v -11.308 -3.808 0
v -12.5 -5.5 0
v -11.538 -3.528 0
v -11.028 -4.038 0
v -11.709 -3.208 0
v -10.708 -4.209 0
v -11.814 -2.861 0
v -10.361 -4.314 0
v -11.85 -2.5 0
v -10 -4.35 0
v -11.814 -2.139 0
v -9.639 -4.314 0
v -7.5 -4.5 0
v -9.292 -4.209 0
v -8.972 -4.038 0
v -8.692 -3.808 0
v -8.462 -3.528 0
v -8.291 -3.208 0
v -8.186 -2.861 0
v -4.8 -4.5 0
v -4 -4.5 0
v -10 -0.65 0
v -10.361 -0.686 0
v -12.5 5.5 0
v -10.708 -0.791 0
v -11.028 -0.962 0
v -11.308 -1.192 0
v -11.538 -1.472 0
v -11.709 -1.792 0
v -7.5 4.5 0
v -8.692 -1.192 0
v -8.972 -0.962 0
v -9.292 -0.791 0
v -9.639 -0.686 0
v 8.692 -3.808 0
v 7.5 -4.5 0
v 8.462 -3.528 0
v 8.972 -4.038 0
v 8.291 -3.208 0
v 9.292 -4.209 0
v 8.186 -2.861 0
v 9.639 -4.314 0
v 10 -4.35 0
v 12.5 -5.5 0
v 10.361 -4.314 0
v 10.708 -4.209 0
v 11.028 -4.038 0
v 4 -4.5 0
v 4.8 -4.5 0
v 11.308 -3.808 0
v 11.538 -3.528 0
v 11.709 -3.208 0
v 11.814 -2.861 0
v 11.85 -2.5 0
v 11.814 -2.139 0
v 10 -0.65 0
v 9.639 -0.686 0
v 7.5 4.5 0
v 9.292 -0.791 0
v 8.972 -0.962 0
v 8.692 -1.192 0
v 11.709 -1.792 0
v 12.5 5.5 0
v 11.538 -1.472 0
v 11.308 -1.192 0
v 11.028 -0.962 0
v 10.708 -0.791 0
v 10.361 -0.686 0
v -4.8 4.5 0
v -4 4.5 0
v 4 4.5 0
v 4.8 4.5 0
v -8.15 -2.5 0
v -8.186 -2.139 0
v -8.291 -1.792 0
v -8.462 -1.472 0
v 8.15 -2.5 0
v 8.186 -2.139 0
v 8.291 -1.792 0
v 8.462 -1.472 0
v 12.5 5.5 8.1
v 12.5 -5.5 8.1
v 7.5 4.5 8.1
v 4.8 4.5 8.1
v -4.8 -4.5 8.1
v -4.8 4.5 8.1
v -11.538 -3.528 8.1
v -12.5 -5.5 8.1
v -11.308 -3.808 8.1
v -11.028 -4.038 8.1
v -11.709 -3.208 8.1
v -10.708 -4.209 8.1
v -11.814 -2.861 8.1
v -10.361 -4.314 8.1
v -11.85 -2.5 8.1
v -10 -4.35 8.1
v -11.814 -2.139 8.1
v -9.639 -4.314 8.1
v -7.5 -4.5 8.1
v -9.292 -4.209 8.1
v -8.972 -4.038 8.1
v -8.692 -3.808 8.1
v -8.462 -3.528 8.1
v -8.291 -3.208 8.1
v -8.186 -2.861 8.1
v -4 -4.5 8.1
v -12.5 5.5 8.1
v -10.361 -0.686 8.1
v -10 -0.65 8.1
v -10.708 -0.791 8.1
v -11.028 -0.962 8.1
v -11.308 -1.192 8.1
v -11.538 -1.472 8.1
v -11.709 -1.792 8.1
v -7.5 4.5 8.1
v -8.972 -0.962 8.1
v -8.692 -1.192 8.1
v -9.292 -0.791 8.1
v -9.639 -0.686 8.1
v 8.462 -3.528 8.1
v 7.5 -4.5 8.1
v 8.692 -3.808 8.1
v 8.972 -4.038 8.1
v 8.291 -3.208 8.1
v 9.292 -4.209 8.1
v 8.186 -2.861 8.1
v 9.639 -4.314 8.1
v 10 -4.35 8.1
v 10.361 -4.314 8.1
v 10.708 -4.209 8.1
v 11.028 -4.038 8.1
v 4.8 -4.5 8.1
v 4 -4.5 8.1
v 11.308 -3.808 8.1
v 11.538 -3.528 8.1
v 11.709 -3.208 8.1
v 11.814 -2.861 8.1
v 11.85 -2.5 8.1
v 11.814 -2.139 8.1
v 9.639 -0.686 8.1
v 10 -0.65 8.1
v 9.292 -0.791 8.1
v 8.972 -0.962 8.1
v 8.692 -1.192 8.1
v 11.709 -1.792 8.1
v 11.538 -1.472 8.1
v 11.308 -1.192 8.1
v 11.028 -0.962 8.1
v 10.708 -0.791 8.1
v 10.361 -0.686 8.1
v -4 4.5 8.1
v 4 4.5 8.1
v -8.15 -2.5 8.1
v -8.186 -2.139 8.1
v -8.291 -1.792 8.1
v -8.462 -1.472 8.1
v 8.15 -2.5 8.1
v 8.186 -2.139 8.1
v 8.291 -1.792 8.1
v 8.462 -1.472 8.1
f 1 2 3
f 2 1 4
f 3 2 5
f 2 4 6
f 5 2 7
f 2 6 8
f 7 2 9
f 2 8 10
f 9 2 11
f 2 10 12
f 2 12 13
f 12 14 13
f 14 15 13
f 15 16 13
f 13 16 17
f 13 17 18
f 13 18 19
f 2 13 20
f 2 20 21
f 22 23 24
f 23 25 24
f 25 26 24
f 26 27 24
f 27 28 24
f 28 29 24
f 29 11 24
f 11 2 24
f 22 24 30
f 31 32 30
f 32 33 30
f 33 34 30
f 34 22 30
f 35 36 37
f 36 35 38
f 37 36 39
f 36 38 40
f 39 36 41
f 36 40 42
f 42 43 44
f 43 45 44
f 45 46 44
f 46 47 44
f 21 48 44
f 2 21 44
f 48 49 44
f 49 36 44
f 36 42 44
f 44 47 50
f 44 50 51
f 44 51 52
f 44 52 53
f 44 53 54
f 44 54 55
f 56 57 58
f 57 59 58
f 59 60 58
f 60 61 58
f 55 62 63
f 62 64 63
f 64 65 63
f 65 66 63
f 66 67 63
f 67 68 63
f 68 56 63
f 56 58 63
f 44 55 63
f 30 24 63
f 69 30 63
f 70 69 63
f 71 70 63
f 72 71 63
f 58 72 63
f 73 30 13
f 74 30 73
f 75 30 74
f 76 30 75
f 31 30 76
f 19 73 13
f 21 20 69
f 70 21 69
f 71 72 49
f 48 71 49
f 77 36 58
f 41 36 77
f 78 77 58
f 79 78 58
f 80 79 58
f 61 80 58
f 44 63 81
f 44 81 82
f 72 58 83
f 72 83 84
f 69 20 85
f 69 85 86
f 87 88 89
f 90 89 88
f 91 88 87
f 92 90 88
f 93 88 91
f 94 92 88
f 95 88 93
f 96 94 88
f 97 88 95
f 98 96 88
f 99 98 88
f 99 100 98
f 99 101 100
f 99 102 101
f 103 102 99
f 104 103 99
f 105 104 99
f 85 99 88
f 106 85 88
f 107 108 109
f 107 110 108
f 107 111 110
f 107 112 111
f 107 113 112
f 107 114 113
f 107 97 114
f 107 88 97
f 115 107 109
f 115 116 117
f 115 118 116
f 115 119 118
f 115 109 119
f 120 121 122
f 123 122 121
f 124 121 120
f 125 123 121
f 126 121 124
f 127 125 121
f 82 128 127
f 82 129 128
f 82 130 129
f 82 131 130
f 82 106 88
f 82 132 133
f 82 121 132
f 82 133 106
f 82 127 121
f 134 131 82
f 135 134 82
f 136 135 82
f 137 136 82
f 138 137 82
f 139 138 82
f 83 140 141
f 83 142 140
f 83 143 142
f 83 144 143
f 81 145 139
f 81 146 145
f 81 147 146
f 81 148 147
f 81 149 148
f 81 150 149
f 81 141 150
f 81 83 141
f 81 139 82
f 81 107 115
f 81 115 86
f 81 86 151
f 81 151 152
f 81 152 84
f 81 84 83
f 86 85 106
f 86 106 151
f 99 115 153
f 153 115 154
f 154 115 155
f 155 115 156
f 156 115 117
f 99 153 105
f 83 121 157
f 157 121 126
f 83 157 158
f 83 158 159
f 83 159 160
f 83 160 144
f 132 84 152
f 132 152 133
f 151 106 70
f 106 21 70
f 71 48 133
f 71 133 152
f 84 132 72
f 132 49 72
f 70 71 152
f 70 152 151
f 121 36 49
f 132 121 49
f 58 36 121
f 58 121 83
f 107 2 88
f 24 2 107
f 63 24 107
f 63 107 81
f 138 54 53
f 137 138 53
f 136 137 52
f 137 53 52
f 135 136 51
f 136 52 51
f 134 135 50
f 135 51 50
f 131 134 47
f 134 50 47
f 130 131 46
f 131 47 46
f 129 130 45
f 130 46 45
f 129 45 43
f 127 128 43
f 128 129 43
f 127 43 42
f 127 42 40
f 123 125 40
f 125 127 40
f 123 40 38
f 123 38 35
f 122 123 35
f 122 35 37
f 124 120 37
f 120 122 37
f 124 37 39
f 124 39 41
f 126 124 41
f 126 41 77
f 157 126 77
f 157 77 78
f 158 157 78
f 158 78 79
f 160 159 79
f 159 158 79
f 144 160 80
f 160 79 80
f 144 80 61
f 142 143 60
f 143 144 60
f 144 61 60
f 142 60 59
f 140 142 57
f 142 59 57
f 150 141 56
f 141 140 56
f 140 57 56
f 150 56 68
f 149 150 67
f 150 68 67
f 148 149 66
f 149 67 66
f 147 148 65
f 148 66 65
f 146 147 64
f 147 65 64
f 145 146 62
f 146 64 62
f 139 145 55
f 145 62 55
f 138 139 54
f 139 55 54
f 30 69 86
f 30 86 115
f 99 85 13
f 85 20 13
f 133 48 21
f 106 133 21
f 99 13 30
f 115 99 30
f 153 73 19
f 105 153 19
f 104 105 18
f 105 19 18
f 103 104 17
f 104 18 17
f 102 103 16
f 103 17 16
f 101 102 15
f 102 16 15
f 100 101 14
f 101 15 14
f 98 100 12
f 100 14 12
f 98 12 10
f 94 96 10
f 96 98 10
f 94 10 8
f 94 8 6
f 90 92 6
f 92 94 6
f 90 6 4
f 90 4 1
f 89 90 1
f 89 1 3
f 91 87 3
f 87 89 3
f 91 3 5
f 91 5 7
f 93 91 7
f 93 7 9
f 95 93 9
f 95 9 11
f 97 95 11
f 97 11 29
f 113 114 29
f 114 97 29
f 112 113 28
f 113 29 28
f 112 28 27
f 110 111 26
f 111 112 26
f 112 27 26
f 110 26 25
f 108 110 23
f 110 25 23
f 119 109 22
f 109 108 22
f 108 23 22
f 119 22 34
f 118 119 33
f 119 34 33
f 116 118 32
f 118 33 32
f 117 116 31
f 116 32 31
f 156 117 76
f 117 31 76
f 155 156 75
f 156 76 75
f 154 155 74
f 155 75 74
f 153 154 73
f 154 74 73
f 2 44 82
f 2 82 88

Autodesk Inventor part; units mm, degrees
ref_plane "YZ Plane" through (0, 0, 0) normal (1, 0, 0) x (0, 1, 0)
ref_plane "XZ Plane" through (0, 0, 0) normal (0, 1, 0) x (-1, 0, 0)
ref_plane "XY Plane" through (0, 0, 0) normal (0, 0, 1) x (1, 0, 0)
sketch "スケッチ1" plane through (0, 0, 0) normal (0, 0, 1) x (1, 0, 0)
  line L0 (12.5, -5.5) -> (-12.5, -5.5)
  line L1 (-12.5, -5.5) -> (-12.5, 5.5)
  line L2 (-12.5, 5.5) -> (12.5, 5.5)
  line L3 (12.5, 5.5) -> (12.5, -5.5)
  line L4 (12.5, -5.5) -> (-12.5, 5.5) construction
  line L5 (-12.5, -5.5) -> (12.5, 5.5) construction
  circle A0 centre (10, -2.5) radius 1.85
  circle A1 centre (-10, -2.5) radius 1.85
  line L6 (12.5, -4.5) -> (-12.5, -4.5)
  line L7 (12.5, 4.5) -> (-12.5, 4.5)
  line L8 (4, -4.5) -> (4, 4.5)
  line L9 (-4, -4.5) -> (-4, 4.5)
  line L10 (4.8, -4.5) -> (4.8, 4.5)
  line L11 (-4.8, -4.5) -> (-4.8, 4.5)
  line L12 (7.5, -4.5) -> (7.5, 4.5)
  line L13 (6.7, -4.5) -> (6.7, 4.5)
  line L14 (-7.5, -4.5) -> (-7.5, 4.5)
  line L15 (-6.7, -4.5) -> (-6.7, 4.5)
  point P0 (0, 0)
  dimension "d0" = 25
  dimension "d1" = 11
  dimension "d2" = 3.7
  dimension "d3" = 3.7
extrude "押し出し1" add sketch "スケッチ1" along normal blind 8.1 contours L0 L1 L6 L3 | L6 L12 L7 L3 | L1 L7 L14 L6 | L7 L1 L2 L3 | L6 L8 L7 L10 | L11 L7 L9 L6
properties part number "griper_base_TPU-2" material "ゴム、シリコーン"
